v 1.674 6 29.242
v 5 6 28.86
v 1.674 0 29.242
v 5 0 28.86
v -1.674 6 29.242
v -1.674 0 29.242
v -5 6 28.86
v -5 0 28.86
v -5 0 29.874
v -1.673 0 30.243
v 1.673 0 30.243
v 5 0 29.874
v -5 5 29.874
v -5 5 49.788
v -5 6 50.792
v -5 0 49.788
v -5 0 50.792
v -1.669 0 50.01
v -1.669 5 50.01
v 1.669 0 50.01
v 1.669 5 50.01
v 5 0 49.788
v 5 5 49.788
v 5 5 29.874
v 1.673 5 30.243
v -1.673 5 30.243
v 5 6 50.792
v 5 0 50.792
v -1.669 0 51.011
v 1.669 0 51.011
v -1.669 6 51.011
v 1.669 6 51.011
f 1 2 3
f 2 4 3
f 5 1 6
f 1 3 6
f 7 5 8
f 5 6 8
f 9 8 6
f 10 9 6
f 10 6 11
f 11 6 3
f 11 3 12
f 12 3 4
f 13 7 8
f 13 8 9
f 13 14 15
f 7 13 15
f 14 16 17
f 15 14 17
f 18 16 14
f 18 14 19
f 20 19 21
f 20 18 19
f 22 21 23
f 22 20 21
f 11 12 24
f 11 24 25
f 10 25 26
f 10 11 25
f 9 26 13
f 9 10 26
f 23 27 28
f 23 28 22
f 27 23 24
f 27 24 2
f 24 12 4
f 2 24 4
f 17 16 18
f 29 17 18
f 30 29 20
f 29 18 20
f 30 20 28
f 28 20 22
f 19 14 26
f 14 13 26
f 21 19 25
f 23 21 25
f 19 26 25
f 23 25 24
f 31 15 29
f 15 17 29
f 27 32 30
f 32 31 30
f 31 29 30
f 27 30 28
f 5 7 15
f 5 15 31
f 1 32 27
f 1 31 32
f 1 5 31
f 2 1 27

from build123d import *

# Parameters (mm, degrees)
BOSS_EXTRUDE1_DEPTH = 5
SHELL2_T            = 1


with BuildPart() as part:
    # Sketch1 → Boss-Extrude1 (new body)
    with BuildSketch(Plane(origin=(0, 0, 0), x_dir=(1, 0, 0), z_dir=(0, 1, 0))):
        with BuildLine():
            ThreePointArc((-5, -49.787563146), (0, -50.038), (5, -49.787563146))
            Line((5, -49.787563146), (5, -29.873965426))
            ThreePointArc((5, -29.873965426), (0, -30.2895), (-5, -29.873965426))
            Line((-5, -29.873965426), (-5, -49.787563146))
        make_face()
    extrude(amount=BOSS_EXTRUDE1_DEPTH)

    # Shell2
    shell2_openings = [part.faces().sort_by_distance(p)[0] for p in [
        (5, 2.5, 39.830764286),
        (-5, 2.5, 39.830764286),
        (0, 0, 40.052741683),
    ]]
    offset(amount=SHELL2_T, openings=shell2_openings, kind=Kind.INTERSECTION)


solid = part.part
